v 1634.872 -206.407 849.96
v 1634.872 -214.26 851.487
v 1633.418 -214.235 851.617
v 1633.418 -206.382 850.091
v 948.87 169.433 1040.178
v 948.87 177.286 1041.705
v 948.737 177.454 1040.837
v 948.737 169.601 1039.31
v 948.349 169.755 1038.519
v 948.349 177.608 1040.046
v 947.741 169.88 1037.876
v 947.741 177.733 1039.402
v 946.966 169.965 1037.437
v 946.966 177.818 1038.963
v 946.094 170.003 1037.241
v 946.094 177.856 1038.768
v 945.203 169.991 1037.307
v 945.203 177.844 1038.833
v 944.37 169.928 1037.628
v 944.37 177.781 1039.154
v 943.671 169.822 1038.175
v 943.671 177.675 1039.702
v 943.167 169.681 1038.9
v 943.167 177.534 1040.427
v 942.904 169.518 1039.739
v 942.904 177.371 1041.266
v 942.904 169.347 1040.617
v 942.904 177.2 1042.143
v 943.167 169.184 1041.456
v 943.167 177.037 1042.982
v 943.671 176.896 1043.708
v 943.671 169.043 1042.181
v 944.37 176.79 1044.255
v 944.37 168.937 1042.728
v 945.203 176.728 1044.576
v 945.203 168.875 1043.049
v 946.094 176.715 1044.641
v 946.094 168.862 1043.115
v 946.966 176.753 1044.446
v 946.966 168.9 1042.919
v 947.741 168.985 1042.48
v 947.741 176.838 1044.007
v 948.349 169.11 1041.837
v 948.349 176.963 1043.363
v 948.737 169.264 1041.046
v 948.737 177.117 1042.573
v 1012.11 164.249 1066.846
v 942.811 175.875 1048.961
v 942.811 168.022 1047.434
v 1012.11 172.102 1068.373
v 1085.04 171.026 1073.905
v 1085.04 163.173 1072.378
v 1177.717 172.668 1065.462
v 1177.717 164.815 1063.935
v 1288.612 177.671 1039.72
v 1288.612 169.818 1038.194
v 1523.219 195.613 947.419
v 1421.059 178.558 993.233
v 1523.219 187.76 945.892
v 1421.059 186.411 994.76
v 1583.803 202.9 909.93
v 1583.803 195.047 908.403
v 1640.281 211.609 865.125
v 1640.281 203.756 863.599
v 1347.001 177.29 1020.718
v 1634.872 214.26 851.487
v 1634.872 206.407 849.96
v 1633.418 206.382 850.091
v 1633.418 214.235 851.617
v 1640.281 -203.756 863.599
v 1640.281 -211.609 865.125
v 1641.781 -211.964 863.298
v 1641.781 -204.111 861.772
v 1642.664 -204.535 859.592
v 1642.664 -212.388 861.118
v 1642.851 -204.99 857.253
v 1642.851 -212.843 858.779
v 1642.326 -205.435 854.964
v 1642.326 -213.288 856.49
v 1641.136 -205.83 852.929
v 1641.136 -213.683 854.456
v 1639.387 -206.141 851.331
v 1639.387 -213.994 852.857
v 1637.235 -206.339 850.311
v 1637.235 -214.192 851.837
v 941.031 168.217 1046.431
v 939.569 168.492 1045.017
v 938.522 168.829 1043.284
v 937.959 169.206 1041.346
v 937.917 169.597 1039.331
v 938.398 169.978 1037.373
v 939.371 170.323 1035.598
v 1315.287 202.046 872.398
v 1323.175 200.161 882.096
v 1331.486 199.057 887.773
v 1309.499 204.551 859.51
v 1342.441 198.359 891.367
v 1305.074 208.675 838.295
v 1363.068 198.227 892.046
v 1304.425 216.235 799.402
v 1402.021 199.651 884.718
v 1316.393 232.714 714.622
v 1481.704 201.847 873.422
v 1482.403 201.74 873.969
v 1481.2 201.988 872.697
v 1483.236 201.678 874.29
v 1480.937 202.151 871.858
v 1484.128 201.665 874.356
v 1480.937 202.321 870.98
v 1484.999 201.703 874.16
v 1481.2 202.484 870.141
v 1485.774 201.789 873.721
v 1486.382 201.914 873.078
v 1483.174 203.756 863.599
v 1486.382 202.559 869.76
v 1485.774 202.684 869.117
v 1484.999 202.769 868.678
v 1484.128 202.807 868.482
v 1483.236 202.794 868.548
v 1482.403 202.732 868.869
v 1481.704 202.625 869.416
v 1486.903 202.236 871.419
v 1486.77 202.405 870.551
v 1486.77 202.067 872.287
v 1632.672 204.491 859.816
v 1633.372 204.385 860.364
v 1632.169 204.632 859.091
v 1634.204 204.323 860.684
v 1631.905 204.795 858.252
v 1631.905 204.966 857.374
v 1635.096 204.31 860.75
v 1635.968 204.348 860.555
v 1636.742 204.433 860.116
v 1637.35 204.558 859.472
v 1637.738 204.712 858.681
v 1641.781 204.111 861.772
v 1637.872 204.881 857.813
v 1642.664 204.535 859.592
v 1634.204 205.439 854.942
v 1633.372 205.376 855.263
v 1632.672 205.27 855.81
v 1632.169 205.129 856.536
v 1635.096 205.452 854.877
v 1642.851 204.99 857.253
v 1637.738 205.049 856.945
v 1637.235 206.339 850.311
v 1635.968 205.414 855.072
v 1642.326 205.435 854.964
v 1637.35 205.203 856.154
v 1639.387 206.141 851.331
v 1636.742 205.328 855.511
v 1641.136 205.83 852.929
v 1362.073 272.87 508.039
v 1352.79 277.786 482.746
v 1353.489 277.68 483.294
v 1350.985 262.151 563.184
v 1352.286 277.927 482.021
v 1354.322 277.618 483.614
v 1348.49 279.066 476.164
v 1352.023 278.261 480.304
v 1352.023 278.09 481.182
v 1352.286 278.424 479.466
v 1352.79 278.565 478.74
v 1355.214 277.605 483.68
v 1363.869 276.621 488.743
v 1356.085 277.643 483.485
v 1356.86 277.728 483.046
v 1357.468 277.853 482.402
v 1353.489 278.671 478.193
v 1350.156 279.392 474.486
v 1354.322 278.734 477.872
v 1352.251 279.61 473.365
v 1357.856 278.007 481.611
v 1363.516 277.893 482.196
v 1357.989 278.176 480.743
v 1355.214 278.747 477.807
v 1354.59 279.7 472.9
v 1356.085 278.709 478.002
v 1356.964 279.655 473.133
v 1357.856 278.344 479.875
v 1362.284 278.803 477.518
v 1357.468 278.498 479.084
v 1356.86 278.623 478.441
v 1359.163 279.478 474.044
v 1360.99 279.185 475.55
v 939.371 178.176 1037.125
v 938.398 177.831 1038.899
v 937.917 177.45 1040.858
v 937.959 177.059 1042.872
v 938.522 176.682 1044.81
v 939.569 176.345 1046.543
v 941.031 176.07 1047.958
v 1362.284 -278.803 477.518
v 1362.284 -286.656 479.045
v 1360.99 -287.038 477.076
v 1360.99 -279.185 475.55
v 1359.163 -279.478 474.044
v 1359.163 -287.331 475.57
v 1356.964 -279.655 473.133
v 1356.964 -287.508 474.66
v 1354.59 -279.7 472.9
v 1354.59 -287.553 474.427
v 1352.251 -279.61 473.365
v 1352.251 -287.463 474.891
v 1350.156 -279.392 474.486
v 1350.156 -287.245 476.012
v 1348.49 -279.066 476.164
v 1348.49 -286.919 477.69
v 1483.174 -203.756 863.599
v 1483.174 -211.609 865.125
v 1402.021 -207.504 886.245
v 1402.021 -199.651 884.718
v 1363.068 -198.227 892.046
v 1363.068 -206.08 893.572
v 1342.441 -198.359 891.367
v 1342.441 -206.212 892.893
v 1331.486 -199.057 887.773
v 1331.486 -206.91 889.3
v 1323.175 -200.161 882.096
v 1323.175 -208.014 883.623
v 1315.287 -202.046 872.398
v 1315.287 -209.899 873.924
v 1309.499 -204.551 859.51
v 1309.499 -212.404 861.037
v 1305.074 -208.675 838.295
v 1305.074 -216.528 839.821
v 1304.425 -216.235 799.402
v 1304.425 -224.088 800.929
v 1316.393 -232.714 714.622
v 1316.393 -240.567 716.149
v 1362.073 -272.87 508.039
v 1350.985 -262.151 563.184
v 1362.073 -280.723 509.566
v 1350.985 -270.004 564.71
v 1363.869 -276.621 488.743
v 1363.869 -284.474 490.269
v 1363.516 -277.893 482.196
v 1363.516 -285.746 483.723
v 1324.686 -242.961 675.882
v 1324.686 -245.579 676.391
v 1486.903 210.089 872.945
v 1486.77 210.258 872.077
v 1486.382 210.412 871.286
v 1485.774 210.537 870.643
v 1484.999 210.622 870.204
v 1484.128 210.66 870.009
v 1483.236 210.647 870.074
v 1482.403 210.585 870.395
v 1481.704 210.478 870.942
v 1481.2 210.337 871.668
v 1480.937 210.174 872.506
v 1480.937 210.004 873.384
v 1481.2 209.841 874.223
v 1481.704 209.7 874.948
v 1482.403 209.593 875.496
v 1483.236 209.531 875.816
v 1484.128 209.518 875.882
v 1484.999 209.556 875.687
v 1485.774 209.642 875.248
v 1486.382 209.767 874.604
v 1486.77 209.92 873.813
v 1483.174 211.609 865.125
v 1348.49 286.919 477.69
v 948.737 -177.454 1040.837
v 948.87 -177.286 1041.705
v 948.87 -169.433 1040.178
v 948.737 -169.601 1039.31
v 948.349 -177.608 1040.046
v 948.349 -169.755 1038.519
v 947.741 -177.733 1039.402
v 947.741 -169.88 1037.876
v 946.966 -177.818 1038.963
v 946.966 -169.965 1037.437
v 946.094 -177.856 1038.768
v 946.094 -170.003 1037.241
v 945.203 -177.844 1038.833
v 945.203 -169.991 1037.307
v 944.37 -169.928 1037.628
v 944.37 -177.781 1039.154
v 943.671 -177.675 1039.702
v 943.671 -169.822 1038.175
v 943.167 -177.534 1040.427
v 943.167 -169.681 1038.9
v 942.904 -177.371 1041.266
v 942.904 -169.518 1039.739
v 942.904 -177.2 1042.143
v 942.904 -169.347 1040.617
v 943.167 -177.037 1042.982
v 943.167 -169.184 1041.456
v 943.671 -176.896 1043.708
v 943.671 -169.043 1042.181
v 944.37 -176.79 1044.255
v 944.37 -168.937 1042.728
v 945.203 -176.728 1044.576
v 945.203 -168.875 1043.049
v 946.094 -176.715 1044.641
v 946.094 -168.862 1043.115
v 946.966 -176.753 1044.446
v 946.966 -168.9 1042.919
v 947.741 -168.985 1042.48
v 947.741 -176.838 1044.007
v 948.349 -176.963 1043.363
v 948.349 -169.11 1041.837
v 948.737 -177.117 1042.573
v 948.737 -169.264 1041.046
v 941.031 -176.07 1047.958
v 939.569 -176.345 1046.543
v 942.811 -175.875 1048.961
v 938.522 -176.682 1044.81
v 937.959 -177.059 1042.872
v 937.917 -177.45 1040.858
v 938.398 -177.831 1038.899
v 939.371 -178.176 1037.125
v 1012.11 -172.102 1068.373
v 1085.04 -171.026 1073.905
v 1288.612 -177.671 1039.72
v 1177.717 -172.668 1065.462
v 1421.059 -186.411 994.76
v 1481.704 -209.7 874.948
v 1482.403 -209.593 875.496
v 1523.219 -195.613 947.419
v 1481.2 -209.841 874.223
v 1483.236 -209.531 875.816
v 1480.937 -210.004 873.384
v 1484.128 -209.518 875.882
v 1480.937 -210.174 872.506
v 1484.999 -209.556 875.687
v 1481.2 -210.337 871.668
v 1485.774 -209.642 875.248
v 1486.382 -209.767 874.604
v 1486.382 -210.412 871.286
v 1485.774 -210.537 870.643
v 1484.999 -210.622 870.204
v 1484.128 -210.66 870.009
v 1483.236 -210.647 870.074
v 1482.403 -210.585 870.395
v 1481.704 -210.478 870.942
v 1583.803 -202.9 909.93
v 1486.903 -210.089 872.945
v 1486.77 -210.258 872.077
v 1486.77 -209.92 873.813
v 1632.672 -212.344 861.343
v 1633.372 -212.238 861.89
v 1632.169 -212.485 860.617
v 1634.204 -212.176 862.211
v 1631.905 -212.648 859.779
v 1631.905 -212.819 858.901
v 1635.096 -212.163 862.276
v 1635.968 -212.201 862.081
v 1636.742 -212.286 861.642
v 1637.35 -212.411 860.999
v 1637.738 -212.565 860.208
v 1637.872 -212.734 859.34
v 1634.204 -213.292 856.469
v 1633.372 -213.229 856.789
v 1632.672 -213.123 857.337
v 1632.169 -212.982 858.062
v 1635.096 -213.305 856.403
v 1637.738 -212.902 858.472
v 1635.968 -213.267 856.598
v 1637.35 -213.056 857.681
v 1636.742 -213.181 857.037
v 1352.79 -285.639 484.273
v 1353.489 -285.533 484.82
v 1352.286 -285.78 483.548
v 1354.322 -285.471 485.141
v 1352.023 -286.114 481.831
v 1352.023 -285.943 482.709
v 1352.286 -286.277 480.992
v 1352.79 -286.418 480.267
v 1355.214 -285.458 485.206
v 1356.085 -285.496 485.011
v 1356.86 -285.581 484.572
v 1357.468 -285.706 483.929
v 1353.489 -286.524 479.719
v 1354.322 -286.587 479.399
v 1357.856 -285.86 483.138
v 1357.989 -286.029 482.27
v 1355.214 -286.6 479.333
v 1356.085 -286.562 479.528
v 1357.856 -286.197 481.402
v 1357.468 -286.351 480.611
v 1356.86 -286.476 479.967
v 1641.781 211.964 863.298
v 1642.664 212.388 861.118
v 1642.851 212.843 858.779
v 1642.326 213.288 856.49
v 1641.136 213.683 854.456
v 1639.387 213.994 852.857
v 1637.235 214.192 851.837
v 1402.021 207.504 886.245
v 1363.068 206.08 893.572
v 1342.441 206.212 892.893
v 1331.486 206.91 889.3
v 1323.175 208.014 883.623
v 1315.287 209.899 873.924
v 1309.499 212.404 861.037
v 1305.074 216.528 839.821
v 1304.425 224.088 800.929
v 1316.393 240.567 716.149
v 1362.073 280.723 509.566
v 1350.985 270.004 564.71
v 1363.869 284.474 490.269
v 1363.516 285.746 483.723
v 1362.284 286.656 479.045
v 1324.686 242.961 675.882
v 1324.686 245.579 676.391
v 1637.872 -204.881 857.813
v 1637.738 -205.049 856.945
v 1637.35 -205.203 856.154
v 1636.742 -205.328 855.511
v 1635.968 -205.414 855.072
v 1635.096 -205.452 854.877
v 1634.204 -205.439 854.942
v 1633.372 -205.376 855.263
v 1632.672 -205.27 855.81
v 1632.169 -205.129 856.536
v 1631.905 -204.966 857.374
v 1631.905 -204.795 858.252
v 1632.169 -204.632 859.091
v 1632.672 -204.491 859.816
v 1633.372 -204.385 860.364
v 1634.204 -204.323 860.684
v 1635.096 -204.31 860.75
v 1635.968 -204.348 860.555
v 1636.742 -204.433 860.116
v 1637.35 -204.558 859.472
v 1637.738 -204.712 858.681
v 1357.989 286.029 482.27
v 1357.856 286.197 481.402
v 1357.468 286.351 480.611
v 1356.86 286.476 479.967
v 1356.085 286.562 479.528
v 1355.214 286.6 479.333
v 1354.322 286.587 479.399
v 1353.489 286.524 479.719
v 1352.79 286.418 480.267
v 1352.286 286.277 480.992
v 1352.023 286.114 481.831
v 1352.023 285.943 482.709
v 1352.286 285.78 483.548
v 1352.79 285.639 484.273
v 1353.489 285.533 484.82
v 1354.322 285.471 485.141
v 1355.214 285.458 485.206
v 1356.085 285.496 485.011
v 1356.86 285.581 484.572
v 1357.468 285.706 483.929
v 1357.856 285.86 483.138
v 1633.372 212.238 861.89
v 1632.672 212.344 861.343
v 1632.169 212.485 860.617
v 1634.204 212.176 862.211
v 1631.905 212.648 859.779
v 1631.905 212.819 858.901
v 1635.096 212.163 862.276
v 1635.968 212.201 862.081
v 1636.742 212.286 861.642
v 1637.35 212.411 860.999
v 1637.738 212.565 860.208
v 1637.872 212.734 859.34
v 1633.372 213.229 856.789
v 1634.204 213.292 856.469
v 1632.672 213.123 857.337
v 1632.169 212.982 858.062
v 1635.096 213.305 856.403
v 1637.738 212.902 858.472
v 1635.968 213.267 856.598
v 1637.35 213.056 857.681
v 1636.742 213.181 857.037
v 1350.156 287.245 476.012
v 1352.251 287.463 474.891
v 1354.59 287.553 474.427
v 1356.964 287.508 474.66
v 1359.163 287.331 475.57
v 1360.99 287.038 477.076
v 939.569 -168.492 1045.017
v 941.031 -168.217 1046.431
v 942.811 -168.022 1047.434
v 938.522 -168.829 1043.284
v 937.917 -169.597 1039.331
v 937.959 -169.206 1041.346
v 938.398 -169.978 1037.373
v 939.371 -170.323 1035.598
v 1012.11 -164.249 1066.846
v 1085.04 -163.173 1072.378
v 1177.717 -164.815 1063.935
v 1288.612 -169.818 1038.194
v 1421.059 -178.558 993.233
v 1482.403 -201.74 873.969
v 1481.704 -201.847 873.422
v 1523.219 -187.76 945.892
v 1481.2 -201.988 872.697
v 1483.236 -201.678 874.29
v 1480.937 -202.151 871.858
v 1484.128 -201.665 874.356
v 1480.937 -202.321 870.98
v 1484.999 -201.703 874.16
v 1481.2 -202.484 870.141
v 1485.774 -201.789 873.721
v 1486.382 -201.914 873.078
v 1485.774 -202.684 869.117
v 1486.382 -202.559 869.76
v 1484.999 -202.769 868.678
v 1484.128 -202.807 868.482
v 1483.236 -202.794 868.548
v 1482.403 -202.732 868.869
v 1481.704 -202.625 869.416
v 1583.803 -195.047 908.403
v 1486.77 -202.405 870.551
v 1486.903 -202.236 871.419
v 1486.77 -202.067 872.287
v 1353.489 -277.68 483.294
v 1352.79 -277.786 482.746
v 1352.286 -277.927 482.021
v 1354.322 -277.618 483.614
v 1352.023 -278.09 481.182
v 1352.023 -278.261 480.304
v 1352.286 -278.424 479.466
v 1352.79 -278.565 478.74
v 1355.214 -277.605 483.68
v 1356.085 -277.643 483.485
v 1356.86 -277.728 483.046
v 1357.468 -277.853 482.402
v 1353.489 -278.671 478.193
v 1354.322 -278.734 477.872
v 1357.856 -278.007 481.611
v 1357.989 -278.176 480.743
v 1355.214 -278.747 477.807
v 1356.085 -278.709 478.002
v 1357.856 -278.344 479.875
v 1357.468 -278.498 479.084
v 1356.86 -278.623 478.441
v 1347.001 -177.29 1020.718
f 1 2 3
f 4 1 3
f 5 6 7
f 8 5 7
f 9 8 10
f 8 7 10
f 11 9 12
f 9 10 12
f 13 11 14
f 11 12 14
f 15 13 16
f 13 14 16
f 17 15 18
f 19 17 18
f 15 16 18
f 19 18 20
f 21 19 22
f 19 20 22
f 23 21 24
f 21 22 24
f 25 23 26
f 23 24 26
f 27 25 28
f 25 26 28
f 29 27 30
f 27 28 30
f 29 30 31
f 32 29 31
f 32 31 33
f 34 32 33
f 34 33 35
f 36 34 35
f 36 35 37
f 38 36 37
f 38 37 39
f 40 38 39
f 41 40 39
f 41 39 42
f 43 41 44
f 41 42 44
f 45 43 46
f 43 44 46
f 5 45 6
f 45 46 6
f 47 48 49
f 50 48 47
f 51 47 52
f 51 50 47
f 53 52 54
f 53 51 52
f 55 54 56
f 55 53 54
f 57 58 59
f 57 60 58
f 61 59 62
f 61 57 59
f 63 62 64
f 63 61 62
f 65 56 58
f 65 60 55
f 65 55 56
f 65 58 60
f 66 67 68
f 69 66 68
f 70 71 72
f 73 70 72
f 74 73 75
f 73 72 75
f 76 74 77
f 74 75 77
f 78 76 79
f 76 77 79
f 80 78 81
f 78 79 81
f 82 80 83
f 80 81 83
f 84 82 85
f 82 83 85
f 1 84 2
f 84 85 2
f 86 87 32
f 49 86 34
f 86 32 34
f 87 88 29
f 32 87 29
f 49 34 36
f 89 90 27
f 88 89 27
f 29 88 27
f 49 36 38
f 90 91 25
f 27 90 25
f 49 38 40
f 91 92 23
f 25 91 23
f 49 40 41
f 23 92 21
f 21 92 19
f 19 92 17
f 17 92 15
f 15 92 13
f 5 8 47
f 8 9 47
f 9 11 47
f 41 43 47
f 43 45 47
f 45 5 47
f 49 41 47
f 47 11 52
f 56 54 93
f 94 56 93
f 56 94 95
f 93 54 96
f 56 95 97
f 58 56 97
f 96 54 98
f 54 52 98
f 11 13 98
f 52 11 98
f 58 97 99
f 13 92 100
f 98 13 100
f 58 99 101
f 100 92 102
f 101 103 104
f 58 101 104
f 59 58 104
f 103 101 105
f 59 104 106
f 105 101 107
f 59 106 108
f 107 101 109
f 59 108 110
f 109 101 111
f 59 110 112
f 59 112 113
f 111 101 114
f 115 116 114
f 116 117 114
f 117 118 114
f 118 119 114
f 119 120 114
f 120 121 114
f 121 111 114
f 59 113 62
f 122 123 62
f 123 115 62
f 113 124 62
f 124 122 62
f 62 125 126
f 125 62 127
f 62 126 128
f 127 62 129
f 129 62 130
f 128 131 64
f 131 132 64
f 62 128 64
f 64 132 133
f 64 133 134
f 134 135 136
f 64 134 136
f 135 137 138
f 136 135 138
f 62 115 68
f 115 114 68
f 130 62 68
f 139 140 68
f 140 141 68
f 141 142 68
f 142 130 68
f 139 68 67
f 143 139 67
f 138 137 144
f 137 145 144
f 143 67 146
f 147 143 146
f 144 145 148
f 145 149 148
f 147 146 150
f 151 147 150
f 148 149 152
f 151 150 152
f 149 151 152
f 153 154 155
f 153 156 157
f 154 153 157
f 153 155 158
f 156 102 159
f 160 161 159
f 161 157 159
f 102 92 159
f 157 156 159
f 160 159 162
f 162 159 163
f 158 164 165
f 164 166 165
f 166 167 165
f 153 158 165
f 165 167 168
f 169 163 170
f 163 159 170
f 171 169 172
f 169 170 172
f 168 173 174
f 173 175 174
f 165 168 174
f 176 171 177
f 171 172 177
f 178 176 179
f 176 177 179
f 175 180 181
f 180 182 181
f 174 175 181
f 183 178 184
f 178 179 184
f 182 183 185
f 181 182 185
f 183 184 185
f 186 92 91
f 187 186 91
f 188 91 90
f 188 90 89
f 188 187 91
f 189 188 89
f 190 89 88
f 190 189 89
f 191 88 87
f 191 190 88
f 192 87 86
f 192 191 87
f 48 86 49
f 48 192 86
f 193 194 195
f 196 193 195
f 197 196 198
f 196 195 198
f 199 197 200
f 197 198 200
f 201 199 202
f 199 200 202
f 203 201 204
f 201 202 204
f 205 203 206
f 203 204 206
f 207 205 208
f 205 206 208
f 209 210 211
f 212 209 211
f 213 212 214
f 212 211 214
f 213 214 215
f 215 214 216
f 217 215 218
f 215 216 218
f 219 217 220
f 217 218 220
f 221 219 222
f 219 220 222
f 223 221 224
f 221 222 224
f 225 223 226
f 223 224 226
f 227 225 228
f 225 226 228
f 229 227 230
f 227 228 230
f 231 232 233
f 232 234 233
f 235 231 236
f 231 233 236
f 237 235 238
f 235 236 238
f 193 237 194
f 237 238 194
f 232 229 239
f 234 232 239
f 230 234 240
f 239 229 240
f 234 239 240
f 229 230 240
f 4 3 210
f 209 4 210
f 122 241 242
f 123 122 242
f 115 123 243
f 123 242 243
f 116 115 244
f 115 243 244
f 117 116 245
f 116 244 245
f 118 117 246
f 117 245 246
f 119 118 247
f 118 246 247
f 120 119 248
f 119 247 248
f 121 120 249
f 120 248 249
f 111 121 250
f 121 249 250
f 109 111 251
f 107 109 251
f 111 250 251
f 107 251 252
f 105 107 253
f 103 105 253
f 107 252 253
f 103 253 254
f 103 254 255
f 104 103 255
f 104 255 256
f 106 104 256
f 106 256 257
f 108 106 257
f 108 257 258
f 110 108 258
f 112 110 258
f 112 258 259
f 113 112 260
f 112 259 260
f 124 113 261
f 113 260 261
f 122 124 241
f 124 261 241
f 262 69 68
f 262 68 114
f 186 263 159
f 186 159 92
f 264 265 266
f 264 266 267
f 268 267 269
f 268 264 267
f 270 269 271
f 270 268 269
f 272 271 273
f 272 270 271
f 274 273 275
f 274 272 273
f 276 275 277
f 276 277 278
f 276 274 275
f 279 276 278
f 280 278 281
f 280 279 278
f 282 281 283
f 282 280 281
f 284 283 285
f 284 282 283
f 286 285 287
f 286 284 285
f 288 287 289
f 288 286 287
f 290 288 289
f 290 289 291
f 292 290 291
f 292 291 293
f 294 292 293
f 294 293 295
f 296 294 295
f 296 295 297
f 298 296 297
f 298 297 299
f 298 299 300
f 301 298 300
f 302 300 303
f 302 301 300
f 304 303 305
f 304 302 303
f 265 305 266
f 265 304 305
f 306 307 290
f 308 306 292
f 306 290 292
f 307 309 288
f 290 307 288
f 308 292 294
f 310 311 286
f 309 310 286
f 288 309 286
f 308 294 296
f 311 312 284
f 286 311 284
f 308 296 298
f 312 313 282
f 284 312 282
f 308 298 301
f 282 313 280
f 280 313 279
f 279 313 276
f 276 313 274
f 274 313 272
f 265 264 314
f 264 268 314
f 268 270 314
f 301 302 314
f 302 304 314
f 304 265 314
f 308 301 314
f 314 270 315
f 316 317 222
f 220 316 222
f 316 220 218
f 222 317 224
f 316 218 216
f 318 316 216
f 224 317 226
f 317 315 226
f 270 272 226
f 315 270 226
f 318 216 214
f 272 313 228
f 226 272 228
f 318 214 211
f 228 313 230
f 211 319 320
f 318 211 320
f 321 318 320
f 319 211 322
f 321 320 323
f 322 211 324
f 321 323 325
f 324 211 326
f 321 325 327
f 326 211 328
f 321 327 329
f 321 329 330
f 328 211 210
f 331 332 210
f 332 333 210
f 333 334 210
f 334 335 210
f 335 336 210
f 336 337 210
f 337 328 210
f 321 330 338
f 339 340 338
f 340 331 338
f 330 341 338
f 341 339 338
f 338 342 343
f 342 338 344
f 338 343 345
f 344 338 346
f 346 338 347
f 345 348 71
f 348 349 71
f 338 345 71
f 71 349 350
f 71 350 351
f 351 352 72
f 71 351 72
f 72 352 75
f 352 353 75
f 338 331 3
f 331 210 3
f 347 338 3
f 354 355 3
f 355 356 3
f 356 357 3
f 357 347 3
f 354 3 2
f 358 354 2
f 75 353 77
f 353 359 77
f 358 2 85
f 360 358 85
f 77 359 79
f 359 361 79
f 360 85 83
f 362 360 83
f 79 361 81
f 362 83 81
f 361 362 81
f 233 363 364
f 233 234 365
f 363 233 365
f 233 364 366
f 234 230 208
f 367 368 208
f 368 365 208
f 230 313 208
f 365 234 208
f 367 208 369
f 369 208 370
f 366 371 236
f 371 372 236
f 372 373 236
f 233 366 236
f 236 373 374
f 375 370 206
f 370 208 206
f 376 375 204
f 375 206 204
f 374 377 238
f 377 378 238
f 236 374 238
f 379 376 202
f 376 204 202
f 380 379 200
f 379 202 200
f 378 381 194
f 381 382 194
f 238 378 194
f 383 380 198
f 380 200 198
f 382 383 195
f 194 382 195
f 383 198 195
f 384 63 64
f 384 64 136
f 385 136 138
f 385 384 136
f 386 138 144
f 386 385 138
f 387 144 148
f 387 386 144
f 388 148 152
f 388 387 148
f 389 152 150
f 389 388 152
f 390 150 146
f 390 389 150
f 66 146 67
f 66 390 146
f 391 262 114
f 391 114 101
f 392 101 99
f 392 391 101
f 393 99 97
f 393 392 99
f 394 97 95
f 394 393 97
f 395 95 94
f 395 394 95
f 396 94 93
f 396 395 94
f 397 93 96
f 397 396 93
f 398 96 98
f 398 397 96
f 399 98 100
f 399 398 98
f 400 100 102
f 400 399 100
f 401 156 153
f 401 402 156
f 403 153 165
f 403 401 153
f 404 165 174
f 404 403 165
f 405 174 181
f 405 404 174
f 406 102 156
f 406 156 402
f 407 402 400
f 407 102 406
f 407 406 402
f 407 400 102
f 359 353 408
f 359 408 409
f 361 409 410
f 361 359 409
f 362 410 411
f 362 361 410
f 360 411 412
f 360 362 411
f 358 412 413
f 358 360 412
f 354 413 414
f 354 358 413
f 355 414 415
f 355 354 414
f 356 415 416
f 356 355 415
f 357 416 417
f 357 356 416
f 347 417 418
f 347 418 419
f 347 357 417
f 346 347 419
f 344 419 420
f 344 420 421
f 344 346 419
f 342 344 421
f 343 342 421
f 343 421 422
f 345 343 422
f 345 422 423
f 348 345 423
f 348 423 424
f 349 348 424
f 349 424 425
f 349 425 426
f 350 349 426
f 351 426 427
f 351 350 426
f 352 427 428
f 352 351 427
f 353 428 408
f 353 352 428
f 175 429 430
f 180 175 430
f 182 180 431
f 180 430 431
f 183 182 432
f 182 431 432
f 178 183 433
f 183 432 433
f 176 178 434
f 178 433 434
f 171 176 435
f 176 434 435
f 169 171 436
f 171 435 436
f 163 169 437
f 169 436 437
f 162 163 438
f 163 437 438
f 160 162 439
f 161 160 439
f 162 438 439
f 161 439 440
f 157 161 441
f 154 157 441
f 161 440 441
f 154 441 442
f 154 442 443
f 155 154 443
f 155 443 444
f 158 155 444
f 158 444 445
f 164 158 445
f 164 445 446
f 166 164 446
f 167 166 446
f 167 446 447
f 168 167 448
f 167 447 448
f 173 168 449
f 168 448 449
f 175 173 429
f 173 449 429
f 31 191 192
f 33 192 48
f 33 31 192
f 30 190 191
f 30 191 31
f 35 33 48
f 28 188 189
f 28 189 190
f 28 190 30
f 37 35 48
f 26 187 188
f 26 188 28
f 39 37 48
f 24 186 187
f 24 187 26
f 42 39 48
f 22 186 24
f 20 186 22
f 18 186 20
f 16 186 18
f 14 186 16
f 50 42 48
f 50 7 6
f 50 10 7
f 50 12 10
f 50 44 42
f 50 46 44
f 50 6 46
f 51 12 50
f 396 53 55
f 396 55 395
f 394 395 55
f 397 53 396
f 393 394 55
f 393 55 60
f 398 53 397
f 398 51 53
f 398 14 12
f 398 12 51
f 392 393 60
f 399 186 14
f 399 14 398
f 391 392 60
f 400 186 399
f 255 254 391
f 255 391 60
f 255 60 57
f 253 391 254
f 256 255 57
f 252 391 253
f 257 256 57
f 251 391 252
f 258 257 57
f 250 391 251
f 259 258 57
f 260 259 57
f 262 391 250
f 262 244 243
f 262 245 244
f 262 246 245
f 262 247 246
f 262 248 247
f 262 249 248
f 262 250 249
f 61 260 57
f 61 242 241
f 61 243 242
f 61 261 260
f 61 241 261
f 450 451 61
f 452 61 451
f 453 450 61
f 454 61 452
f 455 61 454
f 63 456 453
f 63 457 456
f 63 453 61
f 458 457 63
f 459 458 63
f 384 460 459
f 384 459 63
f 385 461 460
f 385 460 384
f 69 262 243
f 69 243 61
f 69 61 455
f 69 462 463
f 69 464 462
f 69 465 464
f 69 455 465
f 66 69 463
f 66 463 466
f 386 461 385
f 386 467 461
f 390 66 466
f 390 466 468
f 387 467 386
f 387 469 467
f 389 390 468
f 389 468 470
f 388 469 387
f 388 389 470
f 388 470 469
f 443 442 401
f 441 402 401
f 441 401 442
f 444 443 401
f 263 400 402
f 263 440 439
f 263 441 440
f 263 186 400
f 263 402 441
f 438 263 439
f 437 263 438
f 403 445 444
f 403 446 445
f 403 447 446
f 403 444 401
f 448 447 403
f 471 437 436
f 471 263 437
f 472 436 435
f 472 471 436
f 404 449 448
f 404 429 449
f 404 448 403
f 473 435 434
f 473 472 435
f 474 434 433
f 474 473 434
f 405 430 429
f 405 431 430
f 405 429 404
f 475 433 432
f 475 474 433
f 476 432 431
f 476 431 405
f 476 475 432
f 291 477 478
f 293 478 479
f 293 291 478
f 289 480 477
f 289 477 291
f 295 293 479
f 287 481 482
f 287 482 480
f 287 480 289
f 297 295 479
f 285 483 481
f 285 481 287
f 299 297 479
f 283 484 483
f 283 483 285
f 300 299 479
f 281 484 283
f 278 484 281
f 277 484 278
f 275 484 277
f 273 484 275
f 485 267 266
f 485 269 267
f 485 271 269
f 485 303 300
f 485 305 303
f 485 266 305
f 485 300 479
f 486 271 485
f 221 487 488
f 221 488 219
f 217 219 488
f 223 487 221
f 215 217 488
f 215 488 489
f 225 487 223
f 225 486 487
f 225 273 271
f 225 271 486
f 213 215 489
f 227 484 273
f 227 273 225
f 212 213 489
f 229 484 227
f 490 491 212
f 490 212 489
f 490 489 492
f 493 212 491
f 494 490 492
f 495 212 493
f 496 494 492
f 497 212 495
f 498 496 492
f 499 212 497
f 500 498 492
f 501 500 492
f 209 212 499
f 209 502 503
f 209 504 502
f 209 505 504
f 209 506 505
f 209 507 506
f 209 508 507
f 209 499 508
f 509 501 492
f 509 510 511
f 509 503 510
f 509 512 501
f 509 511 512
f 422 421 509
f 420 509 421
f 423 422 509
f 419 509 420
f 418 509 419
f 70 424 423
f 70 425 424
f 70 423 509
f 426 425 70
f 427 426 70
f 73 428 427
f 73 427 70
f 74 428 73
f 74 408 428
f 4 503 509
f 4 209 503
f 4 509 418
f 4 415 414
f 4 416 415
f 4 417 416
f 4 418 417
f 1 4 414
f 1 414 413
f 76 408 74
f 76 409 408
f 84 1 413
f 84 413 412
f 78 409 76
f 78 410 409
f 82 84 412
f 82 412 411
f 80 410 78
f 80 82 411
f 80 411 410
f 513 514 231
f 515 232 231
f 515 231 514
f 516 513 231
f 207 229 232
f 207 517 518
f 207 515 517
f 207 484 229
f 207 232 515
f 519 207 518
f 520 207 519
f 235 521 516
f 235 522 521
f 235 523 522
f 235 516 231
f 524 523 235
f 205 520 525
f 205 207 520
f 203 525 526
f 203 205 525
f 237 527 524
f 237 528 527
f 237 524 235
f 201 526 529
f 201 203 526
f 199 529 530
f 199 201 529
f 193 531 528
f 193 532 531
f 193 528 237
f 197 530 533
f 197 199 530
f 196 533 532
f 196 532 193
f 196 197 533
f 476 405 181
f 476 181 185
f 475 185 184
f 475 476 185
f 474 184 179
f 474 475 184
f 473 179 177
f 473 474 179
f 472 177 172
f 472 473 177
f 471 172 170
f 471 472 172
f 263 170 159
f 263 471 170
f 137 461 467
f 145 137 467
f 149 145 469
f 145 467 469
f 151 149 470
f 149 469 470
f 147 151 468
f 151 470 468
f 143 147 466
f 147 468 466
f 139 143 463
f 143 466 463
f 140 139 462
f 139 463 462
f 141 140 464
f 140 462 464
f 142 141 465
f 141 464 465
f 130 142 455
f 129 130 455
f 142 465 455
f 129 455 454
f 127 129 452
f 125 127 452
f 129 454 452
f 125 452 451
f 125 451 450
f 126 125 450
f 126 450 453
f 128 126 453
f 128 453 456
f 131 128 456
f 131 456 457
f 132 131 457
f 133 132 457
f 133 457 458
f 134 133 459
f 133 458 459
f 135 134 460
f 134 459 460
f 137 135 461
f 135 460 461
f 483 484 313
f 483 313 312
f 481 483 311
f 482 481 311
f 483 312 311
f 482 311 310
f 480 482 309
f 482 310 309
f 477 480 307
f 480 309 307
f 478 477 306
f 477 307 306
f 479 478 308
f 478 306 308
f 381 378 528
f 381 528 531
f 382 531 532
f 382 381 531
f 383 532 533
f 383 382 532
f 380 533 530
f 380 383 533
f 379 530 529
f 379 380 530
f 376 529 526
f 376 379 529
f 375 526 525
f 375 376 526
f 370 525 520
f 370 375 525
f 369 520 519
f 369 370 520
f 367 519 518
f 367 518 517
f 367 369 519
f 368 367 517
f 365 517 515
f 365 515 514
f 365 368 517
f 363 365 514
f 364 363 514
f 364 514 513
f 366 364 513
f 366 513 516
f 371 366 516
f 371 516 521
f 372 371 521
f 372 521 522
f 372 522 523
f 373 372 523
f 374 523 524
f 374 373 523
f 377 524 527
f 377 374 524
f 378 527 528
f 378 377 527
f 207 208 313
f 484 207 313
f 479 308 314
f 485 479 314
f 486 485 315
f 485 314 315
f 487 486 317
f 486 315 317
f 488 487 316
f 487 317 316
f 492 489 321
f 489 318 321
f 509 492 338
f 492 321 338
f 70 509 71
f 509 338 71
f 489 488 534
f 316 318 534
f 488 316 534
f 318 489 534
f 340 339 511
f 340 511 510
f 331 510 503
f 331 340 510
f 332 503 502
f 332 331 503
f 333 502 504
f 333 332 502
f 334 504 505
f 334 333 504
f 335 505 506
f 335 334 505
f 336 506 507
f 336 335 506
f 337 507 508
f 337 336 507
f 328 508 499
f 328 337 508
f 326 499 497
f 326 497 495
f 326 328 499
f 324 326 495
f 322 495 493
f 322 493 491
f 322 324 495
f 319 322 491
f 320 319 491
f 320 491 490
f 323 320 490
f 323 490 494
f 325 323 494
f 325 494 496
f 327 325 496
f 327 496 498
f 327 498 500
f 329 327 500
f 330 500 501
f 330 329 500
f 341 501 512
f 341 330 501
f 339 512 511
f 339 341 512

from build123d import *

# Parameters (mm, degrees)
SZKIC1_R                    = 3
SZKIC1_R_2                  = 2.999999996
DODANIE_WYCI_GNI_CIE1_DEPTH = 8


with BuildPart() as part:
    # Szkic1 → Dodanie-wyciągnięcie1 (new body)
    with BuildSketch(Plane(origin=(0, -365.945689178, 71.13263619), x_dir=(1, 0, 0), z_dir=(0, 0.981627183, -0.190808995))):
        with BuildLine():
            ThreePointArc((1640.281331001, -808.853368538), (1642.326429132, -800.05707281), (1634.871598877, -794.959745005))
            Line((1634.871598877, -794.959745005), (1633.418389297, -795.092840791))
            Line((1633.418389297, -795.092840791), (1483.1737317, -808.853368538))
            add(Edge.make_bspline(
                [(1483.1737317, -808.853368538), (1437.469754318, -816.5628016), (1275.879179559, -890.619951369), (1317.913749169, -619.983132718), (1370.507425365, -433.806229295), (1362.283628975, -415.546989785)],
                knots=[0, 0, 0, 0, 0.258279361, 0.641643028, 1, 1, 1, 1], degree=3))
            ThreePointArc((1362.283628975, -415.546989785), (1355.785767616, -410.872022391), (1348.49049843, -414.166953328))
            Line((1348.49049843, -414.166953328), (939.37128434, -984.072476035))
            ThreePointArc((939.37128434, -984.072476035), (938.177076077, -990.932618484), (942.811265429, -996.129923251))
            add(Edge.make_bspline(
                [(942.811265429, -996.129923251), (1065.430635851, -1046.869568532), (1335.806413784, -985.712102893), (1556.499884294, -885.756004267), (1640.281331001, -808.853368538)],
                knots=[0, 0, 0, 0, 0.548324659, 1, 1, 1, 1], degree=3))
        make_face()
        with Locations((945.87011042, -988.737801274)):
            Circle(SZKIC1_R, mode=Mode.SUBTRACT)
        with Locations((1483.903377602, -816.820025105)):
            Circle(SZKIC1_R, mode=Mode.SUBTRACT)
        with Locations((1634.871598877, -802.959745005)):
            Circle(SZKIC1_R_2, mode=Mode.SUBTRACT)
        with Locations((1354.98932451, -418.832278566)):
            Circle(SZKIC1_R, mode=Mode.SUBTRACT)
    extrude(amount=DODANIE_WYCI_GNI_CIE1_DEPTH)


with BuildPart() as body_2:
    # Lustro2: mirrored copy
    add(part.part.mirror(Plane.ZX))


solid = Compound([part.part, body_2.part])
